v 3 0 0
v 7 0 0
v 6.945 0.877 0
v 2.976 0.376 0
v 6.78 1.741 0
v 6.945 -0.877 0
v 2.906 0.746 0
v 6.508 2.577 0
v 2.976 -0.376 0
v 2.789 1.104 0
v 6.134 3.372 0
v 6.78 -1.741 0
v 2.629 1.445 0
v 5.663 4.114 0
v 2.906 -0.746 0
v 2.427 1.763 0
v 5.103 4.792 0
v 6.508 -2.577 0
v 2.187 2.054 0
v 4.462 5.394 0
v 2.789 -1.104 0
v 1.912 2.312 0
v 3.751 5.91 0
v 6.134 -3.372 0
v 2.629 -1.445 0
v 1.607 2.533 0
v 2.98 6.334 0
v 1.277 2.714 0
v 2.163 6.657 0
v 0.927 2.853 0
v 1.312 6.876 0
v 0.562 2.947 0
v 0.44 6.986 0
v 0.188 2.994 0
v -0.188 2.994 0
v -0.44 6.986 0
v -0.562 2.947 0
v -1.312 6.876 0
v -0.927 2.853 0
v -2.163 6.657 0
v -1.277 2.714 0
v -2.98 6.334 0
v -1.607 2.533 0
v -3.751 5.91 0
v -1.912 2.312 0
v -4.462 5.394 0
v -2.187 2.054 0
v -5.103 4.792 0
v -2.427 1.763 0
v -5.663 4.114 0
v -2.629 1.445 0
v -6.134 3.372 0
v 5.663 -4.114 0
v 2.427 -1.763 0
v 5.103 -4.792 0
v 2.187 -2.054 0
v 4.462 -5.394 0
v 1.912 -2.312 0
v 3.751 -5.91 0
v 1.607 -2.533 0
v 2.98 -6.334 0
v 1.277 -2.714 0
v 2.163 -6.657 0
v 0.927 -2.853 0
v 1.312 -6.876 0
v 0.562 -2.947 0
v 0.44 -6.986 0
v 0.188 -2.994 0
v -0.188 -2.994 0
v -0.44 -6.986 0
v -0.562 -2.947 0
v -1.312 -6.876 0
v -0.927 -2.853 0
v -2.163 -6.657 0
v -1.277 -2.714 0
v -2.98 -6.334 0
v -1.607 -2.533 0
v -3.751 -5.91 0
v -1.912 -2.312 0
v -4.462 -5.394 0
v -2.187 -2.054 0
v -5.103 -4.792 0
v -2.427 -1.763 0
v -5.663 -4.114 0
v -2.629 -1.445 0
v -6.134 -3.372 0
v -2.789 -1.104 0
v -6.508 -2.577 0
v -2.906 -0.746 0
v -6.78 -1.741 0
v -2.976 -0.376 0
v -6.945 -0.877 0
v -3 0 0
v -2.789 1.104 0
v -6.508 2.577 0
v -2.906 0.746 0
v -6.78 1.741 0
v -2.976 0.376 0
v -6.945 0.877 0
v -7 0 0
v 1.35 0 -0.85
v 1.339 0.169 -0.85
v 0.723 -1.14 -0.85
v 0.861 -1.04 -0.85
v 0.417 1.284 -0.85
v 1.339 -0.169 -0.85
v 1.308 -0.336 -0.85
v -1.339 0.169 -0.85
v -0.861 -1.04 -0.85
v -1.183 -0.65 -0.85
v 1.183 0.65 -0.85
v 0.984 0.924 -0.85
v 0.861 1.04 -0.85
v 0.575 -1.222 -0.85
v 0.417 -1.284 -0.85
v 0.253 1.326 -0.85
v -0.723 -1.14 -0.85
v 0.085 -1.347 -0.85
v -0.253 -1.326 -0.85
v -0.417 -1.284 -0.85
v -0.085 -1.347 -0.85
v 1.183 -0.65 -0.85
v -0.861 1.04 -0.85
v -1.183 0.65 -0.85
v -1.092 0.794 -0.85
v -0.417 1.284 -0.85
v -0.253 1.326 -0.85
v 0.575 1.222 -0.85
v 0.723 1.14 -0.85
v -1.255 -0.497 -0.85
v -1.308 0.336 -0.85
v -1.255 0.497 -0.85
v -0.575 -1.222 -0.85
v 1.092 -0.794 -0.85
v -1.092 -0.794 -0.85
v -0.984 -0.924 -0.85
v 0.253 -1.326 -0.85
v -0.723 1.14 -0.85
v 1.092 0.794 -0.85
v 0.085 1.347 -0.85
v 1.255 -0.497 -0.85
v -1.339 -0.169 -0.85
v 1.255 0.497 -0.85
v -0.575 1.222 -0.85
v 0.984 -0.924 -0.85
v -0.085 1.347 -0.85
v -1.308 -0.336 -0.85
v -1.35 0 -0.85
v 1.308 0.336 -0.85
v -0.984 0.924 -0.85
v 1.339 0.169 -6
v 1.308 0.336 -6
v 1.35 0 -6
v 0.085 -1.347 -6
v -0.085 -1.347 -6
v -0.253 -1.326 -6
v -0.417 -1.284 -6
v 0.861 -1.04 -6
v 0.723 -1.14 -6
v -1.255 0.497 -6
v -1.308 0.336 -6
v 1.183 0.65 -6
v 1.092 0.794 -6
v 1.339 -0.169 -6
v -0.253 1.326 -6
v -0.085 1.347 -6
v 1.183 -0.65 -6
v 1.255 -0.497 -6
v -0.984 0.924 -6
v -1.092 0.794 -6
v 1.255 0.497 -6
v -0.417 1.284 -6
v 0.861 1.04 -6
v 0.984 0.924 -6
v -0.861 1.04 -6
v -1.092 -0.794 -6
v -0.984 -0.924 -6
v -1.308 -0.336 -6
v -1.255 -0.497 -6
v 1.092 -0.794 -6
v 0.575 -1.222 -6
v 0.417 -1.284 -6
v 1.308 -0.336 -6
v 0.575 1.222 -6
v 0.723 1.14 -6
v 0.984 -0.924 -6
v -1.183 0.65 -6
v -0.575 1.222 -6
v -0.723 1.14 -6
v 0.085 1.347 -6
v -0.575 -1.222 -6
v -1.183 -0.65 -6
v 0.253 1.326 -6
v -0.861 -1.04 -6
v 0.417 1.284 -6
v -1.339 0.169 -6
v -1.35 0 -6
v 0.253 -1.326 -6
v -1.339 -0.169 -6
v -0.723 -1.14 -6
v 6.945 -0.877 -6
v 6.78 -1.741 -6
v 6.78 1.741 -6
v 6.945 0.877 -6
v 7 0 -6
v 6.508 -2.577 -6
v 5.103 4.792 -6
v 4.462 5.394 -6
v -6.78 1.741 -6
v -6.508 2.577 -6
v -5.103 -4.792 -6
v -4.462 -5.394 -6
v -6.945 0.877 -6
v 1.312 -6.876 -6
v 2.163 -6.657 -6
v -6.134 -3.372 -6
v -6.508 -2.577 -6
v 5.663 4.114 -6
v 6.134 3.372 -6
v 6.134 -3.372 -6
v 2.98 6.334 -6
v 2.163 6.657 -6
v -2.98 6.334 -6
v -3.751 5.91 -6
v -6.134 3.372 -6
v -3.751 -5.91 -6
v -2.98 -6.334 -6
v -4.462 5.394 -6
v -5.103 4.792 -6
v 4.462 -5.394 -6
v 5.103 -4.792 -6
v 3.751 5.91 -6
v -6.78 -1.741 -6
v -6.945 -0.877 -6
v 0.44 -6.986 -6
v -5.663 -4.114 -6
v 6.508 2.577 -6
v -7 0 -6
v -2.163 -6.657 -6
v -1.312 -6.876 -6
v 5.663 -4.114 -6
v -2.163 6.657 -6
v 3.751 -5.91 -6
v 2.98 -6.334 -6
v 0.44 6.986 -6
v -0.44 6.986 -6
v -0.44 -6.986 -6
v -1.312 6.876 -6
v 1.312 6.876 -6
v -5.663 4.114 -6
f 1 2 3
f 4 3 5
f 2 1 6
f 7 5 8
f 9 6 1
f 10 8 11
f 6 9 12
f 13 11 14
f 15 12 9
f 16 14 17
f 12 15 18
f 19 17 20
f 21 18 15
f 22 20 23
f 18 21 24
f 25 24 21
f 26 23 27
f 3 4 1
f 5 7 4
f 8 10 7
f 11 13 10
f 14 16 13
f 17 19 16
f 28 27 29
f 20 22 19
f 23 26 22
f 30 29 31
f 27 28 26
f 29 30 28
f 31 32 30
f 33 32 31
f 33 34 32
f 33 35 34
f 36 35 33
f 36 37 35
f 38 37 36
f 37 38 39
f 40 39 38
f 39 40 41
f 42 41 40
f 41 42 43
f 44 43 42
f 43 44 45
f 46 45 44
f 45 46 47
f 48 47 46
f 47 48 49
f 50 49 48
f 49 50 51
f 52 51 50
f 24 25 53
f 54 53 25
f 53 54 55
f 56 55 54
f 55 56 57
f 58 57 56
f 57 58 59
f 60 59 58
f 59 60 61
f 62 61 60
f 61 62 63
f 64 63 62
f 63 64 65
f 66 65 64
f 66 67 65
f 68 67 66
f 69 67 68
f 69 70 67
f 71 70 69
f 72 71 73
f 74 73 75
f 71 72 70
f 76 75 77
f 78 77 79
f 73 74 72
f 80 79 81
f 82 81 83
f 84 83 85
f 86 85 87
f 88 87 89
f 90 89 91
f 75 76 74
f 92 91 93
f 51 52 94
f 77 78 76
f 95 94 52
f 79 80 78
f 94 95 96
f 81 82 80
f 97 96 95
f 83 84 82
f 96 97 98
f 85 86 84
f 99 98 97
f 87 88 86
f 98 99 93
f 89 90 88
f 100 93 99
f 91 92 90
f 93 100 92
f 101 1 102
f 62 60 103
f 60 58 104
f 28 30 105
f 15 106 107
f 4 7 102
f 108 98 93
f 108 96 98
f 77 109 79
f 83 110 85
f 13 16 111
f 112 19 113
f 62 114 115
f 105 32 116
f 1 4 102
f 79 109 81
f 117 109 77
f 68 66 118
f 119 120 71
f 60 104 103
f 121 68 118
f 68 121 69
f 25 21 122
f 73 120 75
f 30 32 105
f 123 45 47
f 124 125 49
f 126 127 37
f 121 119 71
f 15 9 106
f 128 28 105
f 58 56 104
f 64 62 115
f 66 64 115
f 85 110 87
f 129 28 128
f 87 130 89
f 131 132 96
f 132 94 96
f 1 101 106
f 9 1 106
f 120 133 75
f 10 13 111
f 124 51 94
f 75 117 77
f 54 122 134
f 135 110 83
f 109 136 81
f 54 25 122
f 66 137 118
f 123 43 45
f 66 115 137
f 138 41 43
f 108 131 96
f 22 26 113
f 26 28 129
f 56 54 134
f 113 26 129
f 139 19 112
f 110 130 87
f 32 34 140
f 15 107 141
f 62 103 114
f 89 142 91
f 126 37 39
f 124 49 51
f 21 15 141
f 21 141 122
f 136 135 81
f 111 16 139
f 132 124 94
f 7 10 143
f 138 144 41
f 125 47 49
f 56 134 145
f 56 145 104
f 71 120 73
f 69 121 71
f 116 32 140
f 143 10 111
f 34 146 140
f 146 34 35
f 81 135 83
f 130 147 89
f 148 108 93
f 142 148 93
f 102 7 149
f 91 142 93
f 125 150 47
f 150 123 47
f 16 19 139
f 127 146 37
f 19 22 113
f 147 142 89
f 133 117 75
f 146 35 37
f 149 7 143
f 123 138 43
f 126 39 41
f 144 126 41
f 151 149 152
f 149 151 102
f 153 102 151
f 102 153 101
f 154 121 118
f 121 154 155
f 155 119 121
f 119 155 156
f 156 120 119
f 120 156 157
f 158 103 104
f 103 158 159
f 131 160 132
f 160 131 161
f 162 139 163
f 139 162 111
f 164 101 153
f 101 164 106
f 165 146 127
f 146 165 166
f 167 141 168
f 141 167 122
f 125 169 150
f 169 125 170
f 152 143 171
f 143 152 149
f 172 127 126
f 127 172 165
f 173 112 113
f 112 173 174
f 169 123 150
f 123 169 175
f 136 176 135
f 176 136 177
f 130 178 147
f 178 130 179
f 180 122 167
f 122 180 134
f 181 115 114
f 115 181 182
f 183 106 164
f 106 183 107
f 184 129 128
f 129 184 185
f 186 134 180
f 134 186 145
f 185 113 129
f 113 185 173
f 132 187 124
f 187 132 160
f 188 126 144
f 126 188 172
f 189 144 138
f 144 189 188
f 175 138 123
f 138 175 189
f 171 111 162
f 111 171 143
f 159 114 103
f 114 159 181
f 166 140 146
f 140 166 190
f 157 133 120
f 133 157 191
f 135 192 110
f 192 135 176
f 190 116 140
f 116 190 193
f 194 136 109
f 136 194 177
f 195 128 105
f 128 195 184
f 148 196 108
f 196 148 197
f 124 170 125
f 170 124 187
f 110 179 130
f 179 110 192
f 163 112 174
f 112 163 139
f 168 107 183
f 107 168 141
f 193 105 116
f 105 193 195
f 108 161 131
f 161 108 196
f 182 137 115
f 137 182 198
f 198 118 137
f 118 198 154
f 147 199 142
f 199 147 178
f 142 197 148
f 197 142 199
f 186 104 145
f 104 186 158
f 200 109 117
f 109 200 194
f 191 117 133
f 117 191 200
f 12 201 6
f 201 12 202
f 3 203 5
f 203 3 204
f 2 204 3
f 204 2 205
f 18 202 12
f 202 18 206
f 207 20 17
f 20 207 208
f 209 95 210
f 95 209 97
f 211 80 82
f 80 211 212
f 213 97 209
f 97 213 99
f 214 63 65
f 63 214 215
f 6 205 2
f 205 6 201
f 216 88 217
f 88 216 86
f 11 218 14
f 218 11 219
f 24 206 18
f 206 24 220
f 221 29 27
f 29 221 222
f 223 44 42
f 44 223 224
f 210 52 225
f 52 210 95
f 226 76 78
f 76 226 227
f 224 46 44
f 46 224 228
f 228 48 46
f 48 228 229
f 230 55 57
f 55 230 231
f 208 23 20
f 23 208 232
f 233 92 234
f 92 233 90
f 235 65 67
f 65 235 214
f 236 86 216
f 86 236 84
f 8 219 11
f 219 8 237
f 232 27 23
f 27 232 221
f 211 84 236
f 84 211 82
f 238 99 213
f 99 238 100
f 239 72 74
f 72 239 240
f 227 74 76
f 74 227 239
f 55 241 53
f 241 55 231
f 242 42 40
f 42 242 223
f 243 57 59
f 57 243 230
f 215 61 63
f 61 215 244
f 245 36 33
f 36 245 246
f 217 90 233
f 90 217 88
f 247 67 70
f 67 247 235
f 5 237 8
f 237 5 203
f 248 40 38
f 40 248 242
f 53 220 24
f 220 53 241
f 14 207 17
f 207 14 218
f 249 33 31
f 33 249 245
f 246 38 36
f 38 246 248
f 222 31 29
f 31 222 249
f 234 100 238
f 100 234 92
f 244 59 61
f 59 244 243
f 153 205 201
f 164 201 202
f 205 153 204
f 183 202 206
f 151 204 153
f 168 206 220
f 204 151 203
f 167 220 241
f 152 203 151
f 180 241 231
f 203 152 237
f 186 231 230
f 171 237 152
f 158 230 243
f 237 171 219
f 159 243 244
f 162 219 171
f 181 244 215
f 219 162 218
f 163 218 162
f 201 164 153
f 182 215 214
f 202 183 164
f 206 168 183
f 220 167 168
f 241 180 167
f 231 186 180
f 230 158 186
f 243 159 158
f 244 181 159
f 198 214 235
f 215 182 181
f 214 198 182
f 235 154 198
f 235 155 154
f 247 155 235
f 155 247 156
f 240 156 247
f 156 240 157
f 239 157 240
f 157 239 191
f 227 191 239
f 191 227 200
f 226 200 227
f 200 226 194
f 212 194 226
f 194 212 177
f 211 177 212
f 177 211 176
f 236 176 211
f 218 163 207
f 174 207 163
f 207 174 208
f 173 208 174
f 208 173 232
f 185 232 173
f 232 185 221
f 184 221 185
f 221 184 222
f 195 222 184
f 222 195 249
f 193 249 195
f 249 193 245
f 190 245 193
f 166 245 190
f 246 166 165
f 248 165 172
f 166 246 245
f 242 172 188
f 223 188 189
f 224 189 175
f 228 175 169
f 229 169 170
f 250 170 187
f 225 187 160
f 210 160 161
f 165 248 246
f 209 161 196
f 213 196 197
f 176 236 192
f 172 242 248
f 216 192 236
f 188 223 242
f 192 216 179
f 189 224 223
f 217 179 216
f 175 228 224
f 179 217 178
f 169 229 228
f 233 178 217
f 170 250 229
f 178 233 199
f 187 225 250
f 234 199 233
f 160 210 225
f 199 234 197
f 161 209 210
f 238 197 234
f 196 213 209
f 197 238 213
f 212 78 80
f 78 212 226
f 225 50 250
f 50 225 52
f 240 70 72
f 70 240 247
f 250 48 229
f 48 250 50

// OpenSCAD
$fn = 50;

difference() {
	union() {
		translate(v = [0, 0, -6.0]) {
			cylinder(h = 6, r = 7.0);
		}
	}
	union() {
		translate(v = [0, 0, 0]) {
			rotate(a = [0, 0, 0]) {
				difference() {
					union() {
						translate(v = [0, 0, -9.0]) {
							cylinder(h = 9, r = 1.0);
						}
						translate(v = [0, 0, -0.85]) {
							cylinder(h = 0.85, r1 = 1.35, r2 = 3.0);
						}
						translate(v = [0, 0, -9.0]) {
							cylinder(h = 9, r = 1.35);
						}
						translate(v = [0, 0, -9.0]) {
							cylinder(h = 9, r = 1.0);
						}
					}
					union();
				}
			}
		}
	}
}
